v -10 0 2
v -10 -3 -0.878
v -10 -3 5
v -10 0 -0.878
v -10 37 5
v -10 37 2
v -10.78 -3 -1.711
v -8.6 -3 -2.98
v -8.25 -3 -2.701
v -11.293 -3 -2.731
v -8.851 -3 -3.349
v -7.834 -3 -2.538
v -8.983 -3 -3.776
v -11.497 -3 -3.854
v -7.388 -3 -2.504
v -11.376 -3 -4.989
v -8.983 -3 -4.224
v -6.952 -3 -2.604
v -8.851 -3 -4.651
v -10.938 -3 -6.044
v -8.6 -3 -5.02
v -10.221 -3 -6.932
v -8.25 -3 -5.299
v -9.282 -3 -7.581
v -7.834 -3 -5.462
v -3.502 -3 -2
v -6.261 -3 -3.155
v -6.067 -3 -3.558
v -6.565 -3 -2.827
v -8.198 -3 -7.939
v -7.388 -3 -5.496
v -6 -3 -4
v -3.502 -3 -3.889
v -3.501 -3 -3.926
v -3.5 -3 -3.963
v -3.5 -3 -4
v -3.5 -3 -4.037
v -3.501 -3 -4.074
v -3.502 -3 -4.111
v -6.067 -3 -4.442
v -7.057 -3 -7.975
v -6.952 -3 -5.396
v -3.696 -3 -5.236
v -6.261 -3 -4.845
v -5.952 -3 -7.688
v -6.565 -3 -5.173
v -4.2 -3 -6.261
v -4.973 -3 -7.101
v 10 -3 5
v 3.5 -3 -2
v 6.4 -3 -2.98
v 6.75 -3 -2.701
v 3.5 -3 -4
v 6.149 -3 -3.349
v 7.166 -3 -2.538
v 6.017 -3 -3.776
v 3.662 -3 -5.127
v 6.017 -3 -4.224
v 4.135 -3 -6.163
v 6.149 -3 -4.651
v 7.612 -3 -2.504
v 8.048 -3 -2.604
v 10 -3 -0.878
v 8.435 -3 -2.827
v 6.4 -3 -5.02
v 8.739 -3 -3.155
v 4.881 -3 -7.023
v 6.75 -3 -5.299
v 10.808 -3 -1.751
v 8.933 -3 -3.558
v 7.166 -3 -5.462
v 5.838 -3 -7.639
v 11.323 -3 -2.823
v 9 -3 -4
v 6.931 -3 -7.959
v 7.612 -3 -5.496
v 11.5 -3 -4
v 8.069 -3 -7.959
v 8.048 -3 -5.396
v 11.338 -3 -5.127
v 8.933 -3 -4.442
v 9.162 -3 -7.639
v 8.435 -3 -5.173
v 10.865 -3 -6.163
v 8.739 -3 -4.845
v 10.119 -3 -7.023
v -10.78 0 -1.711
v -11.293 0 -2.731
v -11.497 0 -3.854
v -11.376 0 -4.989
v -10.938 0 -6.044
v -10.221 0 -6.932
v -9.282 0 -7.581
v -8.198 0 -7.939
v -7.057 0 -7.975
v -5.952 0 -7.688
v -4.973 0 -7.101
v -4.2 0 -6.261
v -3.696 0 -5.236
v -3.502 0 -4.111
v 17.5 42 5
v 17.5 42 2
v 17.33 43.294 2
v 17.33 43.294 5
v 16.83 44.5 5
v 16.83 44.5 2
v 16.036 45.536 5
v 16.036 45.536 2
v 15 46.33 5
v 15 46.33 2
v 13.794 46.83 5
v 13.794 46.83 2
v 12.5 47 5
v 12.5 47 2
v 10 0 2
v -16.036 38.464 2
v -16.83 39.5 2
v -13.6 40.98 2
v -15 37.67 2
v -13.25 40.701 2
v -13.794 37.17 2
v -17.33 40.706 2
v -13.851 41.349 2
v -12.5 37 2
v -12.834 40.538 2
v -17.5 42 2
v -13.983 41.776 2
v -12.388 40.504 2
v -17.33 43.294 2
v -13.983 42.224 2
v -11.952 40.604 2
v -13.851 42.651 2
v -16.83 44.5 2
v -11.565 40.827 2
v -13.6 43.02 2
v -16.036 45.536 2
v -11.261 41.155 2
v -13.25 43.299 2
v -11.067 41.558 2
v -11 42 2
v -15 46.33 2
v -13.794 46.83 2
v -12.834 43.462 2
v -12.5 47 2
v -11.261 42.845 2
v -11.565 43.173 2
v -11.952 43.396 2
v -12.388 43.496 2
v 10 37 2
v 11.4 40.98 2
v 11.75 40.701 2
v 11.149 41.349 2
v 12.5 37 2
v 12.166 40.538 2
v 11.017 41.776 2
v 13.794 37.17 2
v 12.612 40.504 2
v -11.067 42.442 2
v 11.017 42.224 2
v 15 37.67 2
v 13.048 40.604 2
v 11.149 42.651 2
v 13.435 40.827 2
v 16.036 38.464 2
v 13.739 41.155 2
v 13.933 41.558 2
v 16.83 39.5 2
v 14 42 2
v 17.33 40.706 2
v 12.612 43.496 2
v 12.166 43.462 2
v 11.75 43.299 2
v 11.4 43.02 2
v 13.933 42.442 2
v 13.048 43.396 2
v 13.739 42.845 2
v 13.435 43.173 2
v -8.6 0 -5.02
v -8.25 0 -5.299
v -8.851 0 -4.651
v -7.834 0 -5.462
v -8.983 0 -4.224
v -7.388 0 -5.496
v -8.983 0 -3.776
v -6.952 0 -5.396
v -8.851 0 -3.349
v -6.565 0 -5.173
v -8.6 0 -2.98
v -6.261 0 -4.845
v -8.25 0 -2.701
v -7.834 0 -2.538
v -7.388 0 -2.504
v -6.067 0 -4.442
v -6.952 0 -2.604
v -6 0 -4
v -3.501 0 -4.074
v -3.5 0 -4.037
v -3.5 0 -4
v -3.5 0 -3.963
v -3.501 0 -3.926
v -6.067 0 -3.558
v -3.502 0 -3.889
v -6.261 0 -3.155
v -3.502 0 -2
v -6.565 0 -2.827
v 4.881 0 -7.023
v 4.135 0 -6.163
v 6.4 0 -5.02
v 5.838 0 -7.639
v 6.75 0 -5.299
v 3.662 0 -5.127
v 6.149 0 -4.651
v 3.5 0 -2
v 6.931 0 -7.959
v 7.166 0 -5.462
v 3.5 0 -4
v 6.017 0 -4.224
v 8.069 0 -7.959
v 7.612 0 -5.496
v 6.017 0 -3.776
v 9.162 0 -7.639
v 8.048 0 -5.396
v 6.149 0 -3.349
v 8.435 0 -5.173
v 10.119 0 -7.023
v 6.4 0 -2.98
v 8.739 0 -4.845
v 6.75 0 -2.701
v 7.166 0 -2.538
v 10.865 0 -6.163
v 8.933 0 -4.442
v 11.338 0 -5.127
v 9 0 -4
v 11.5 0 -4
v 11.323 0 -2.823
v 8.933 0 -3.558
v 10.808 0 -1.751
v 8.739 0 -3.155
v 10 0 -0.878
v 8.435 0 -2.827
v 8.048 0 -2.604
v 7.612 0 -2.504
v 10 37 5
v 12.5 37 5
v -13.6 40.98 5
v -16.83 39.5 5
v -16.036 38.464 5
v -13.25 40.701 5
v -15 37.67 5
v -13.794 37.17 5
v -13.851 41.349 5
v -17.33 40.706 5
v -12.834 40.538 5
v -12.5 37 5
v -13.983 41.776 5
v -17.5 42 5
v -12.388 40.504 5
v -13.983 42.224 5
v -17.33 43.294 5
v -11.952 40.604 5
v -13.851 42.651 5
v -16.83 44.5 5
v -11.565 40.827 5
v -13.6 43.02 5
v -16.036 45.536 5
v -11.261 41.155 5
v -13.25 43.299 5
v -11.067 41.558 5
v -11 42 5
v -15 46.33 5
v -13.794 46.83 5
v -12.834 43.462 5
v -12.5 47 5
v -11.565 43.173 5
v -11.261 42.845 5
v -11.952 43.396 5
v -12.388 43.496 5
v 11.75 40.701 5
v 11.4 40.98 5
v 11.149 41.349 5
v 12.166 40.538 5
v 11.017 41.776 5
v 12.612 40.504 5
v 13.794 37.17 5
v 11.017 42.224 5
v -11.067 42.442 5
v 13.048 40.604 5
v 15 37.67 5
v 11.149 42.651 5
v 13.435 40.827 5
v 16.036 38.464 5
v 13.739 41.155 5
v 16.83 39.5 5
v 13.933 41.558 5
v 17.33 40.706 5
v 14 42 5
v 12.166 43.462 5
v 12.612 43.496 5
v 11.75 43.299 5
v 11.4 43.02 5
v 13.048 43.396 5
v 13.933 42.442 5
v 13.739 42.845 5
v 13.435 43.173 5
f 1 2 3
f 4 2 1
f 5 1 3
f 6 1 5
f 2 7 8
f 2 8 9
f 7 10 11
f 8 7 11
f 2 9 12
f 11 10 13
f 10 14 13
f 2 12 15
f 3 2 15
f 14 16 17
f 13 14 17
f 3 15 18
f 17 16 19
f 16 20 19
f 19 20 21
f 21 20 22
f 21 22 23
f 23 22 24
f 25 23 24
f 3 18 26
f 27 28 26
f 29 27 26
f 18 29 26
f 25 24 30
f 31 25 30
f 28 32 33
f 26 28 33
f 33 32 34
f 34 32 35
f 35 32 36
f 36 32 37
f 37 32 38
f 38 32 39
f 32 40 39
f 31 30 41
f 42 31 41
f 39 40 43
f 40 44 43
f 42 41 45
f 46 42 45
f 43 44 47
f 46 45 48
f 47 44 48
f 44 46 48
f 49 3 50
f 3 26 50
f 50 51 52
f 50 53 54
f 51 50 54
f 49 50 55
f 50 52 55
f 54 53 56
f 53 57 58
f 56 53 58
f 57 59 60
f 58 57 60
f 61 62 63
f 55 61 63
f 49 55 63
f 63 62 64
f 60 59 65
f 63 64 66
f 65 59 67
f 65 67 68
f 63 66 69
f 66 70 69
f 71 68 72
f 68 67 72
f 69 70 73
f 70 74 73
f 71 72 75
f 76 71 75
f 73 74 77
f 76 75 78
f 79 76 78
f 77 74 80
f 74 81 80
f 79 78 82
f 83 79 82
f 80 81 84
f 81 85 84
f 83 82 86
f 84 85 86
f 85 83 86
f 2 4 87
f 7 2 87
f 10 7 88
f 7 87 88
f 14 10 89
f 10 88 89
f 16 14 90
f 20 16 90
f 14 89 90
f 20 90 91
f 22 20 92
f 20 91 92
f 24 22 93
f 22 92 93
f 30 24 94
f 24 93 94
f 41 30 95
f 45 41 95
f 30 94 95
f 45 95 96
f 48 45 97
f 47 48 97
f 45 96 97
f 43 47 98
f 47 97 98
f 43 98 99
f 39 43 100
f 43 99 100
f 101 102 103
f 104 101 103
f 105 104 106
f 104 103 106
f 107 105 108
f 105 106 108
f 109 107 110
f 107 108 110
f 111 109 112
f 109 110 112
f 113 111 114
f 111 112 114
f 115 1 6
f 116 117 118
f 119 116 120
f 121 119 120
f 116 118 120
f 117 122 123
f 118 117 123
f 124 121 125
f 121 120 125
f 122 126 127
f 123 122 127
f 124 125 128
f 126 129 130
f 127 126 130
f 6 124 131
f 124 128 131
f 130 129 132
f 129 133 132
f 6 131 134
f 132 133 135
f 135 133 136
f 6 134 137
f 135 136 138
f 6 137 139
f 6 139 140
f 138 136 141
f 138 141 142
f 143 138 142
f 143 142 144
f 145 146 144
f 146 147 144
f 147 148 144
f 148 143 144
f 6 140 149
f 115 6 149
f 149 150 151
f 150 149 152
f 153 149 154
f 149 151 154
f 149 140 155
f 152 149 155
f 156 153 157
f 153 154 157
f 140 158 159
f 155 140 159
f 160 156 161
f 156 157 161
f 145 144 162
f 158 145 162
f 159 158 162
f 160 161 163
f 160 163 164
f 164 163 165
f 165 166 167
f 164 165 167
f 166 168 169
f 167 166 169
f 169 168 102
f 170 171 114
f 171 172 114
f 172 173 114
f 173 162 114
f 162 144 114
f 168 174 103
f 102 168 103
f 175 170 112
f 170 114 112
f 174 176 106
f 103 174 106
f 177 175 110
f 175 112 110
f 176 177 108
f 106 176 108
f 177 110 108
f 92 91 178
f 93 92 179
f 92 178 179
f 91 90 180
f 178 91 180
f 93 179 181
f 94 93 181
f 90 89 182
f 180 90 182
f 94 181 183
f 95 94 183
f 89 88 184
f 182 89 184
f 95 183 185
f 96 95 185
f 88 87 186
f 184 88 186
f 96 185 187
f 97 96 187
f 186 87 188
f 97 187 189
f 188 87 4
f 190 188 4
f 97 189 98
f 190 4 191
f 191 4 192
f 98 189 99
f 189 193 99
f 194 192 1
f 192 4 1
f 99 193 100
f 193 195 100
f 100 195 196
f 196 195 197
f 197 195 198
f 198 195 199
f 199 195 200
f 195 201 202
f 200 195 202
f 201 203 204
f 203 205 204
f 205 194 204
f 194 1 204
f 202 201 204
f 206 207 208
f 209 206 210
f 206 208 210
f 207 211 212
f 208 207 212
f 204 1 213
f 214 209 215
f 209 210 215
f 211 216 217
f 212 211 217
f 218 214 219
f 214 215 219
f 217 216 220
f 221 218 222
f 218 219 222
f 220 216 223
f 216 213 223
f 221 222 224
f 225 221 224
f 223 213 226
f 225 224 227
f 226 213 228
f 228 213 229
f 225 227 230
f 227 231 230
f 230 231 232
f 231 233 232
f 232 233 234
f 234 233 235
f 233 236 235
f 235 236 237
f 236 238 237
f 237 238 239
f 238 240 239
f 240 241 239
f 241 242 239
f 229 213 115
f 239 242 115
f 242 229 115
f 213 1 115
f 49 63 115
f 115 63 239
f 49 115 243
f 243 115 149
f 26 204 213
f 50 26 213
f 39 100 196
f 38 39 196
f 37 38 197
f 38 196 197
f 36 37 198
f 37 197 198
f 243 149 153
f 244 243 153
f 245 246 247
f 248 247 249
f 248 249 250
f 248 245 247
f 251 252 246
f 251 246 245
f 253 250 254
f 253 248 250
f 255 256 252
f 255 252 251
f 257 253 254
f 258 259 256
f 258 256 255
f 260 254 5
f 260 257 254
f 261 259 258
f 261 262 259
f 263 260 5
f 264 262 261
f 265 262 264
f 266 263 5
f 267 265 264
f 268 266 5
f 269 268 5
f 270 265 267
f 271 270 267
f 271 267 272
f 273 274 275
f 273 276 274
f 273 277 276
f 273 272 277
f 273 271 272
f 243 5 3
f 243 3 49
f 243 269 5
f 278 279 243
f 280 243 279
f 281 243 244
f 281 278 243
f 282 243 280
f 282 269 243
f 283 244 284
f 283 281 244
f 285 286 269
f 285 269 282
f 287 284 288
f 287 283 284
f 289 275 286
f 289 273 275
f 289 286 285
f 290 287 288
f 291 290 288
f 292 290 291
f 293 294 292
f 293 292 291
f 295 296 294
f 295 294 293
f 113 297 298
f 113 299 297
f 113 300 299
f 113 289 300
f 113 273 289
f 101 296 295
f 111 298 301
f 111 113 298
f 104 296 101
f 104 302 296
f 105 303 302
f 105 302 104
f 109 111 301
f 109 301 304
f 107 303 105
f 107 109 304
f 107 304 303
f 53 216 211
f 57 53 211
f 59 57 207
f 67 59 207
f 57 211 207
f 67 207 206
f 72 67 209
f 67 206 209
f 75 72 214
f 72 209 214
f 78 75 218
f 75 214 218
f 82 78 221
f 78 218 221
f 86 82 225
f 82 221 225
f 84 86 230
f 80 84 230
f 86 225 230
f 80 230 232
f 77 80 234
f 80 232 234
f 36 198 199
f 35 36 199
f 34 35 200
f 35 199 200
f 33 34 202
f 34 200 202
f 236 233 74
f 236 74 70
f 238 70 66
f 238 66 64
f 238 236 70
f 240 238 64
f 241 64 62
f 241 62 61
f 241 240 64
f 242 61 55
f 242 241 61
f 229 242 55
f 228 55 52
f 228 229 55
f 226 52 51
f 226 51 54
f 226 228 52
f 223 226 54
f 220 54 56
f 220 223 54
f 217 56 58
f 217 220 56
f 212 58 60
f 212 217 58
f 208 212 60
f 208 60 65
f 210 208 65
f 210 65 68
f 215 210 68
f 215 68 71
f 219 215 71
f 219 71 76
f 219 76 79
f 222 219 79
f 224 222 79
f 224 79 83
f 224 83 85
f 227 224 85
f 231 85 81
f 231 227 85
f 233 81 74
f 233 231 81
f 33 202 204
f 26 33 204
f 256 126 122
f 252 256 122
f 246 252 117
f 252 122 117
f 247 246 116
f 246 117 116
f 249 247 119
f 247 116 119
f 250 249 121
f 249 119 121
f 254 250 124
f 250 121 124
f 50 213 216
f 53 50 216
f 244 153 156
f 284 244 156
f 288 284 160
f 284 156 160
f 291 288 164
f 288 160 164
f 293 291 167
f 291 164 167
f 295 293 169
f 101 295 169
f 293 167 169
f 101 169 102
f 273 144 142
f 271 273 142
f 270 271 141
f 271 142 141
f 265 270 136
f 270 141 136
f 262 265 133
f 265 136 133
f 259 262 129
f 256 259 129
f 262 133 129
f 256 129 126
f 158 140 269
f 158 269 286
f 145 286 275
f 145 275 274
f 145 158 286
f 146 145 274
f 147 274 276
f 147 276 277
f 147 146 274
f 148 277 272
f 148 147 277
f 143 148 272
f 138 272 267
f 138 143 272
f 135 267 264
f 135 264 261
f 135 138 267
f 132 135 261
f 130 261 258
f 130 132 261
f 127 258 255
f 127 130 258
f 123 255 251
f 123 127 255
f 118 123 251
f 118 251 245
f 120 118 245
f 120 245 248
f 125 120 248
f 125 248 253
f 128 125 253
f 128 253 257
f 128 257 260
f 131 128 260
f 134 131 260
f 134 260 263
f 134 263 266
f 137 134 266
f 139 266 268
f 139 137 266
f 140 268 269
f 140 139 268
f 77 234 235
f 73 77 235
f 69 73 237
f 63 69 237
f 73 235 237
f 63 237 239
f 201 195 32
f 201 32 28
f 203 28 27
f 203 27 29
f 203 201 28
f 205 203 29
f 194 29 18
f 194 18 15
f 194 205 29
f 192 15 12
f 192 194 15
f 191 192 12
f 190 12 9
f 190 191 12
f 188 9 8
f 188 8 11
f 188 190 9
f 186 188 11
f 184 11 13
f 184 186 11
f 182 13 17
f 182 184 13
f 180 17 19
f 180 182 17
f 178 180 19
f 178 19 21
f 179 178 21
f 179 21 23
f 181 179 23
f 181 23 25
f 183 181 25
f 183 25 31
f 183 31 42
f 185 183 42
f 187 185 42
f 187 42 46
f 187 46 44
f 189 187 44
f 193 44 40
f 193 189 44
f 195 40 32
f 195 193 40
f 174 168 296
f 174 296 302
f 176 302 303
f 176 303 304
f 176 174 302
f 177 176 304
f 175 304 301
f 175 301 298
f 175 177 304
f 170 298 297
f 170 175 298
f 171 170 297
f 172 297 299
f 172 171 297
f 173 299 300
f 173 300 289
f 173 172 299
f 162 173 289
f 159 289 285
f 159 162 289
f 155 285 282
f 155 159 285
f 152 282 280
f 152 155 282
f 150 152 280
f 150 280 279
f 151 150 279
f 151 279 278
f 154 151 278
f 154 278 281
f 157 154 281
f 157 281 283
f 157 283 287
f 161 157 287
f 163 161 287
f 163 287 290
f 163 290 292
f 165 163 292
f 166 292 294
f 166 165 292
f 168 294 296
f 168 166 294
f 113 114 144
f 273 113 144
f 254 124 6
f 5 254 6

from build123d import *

# Parameters (mm, degrees)
F0_R     = 1.5
F1_DEPTH = 3
F2_W     = 20
F2_H     = 40
F2_R     = 1.5
F2_H_2   = 10
F3_DEPTH = 3


with BuildPart() as f1:
    # F0 (on Front) → F1 (new body)
    with BuildSketch(Plane.XZ):
        with BuildLine():
            Line((10, 2), (-10, 2))
            Line((-10, 2), (-10, -0.8775010008))
            ThreePointArc((-10, -0.8775010008), (-6.7601527307, -0.0690171689), (-4.0358983849, -2))
            Line((-4.0358983849, -2), (-3.5015512196, -2))
            Line((-3.5015512196, -2), (3.5, -2))
            Line((3.5, -2), (4.0358983849, -2))
            ThreePointArc((4.0358983849, -2), (6.7601527307, -0.0690171689), (10, -0.8775010008))
            Line((10, -0.8775010008), (10, 2))
        make_face()
        with BuildLine():
            ThreePointArc((-4.0358983849, -2), (-6.7601527307, -0.0690171689), (-10, -0.8775010008))
            Line((-10, -0.8775010008), (-10, -2))
            Line((-10, -2), (-4.0358983849, -2))
        make_face()
        with BuildLine():
            Line((-10, -2), (-10, -0.8775010008))
            ThreePointArc((-10, -0.8775010008), (-9.282089766, -7.5810830856), (-3.5015512196, -4.1113882884))
            Line((-3.5015512196, -4.1113882884), (-3.5015512196, -3.8886117116))
            ThreePointArc((-3.5015512196, -3.8886117116), (-3.6510874067, -2.9110225671), (-4.0358983849, -2))
            Line((-4.0358983849, -2), (-10, -2))
        make_face()
        with Locations((-7.5, -4)):
            Circle(F0_R, mode=Mode.SUBTRACT)
        with BuildLine():
            ThreePointArc((11.5, -4), (11.1055512755, -2.2679491924), (10, -0.8775010008))
            Line((10, -0.8775010008), (10, -2))
            Line((10, -2), (4.0358983849, -2))
            ThreePointArc((4.0358983849, -2), (3.6362966948, -2.9647238196), (3.5, -4))
            ThreePointArc((3.5, -4), (7.5, -8), (11.5, -4))
        make_face()
        with Locations((7.5, -4)):
            Circle(F0_R, mode=Mode.SUBTRACT)
        with BuildLine():
            Line((10, -2), (10, -0.8775010008))
            ThreePointArc((10, -0.8775010008), (6.7601527307, -0.0690171689), (4.0358983849, -2))
            Line((4.0358983849, -2), (10, -2))
        make_face()
        with BuildLine():
            Line((-3.5015512196, -2), (-4.0358983849, -2))
            ThreePointArc((-4.0358983849, -2), (-3.6510874067, -2.9110225671), (-3.5015512196, -3.8886117116))
            Line((-3.5015512196, -3.8886117116), (-3.5015512196, -2))
        make_face()
        with BuildLine():
            Line((-3.5015512196, -3.8886117116), (-3.5015512196, -4.1113882884))
            ThreePointArc((-3.5015512196, -4.1113882884), (-3.5003878237, -4.0556995446), (-3.5, -4))
            ThreePointArc((-3.5, -4), (-3.5003878237, -3.9443004554), (-3.5015512196, -3.8886117116))
        make_face()
        with BuildLine():
            ThreePointArc((3.5, -4), (3.6362966948, -2.9647238196), (4.0358983849, -2))
            Line((4.0358983849, -2), (3.5, -2))
            Line((3.5, -2), (3.5, -4))
        make_face()
    extrude(amount=F1_DEPTH)

    # F2 (on face) → F3 (join)
    with BuildSketch(Plane.XY.offset(2)):
        with Locations((0, 17)):
            Rectangle(F2_W, F2_H)
        with BuildLine():
            Line((-12.5, 37), (-10, 37))
            Line((-10, 37), (-10, 47))
            Line((-10, 47), (-12.5, 47))
            ThreePointArc((-12.5, 47), (-16.0355339059, 45.5355339059), (-17.5, 42))
            ThreePointArc((-17.5, 42), (-16.0355339059, 38.4644660941), (-12.5, 37))
        make_face()
        with Locations((-12.5, 42)):
            Circle(F2_R, mode=Mode.SUBTRACT)
        with Locations((0, 42)):
            Rectangle(F2_W, F2_H_2)
        with BuildLine():
            Line((10, 47), (10, 37))
            Line((10, 37), (12.5, 37))
            ThreePointArc((12.5, 37), (16.0355339059, 38.4644660941), (17.5, 42))
            ThreePointArc((17.5, 42), (16.0355339059, 45.5355339059), (12.5, 47))
            Line((12.5, 47), (10, 47))
        make_face()
        with Locations((12.5, 42)):
            Circle(F2_R, mode=Mode.SUBTRACT)
    extrude(amount=F3_DEPTH)


solid = f1.part
